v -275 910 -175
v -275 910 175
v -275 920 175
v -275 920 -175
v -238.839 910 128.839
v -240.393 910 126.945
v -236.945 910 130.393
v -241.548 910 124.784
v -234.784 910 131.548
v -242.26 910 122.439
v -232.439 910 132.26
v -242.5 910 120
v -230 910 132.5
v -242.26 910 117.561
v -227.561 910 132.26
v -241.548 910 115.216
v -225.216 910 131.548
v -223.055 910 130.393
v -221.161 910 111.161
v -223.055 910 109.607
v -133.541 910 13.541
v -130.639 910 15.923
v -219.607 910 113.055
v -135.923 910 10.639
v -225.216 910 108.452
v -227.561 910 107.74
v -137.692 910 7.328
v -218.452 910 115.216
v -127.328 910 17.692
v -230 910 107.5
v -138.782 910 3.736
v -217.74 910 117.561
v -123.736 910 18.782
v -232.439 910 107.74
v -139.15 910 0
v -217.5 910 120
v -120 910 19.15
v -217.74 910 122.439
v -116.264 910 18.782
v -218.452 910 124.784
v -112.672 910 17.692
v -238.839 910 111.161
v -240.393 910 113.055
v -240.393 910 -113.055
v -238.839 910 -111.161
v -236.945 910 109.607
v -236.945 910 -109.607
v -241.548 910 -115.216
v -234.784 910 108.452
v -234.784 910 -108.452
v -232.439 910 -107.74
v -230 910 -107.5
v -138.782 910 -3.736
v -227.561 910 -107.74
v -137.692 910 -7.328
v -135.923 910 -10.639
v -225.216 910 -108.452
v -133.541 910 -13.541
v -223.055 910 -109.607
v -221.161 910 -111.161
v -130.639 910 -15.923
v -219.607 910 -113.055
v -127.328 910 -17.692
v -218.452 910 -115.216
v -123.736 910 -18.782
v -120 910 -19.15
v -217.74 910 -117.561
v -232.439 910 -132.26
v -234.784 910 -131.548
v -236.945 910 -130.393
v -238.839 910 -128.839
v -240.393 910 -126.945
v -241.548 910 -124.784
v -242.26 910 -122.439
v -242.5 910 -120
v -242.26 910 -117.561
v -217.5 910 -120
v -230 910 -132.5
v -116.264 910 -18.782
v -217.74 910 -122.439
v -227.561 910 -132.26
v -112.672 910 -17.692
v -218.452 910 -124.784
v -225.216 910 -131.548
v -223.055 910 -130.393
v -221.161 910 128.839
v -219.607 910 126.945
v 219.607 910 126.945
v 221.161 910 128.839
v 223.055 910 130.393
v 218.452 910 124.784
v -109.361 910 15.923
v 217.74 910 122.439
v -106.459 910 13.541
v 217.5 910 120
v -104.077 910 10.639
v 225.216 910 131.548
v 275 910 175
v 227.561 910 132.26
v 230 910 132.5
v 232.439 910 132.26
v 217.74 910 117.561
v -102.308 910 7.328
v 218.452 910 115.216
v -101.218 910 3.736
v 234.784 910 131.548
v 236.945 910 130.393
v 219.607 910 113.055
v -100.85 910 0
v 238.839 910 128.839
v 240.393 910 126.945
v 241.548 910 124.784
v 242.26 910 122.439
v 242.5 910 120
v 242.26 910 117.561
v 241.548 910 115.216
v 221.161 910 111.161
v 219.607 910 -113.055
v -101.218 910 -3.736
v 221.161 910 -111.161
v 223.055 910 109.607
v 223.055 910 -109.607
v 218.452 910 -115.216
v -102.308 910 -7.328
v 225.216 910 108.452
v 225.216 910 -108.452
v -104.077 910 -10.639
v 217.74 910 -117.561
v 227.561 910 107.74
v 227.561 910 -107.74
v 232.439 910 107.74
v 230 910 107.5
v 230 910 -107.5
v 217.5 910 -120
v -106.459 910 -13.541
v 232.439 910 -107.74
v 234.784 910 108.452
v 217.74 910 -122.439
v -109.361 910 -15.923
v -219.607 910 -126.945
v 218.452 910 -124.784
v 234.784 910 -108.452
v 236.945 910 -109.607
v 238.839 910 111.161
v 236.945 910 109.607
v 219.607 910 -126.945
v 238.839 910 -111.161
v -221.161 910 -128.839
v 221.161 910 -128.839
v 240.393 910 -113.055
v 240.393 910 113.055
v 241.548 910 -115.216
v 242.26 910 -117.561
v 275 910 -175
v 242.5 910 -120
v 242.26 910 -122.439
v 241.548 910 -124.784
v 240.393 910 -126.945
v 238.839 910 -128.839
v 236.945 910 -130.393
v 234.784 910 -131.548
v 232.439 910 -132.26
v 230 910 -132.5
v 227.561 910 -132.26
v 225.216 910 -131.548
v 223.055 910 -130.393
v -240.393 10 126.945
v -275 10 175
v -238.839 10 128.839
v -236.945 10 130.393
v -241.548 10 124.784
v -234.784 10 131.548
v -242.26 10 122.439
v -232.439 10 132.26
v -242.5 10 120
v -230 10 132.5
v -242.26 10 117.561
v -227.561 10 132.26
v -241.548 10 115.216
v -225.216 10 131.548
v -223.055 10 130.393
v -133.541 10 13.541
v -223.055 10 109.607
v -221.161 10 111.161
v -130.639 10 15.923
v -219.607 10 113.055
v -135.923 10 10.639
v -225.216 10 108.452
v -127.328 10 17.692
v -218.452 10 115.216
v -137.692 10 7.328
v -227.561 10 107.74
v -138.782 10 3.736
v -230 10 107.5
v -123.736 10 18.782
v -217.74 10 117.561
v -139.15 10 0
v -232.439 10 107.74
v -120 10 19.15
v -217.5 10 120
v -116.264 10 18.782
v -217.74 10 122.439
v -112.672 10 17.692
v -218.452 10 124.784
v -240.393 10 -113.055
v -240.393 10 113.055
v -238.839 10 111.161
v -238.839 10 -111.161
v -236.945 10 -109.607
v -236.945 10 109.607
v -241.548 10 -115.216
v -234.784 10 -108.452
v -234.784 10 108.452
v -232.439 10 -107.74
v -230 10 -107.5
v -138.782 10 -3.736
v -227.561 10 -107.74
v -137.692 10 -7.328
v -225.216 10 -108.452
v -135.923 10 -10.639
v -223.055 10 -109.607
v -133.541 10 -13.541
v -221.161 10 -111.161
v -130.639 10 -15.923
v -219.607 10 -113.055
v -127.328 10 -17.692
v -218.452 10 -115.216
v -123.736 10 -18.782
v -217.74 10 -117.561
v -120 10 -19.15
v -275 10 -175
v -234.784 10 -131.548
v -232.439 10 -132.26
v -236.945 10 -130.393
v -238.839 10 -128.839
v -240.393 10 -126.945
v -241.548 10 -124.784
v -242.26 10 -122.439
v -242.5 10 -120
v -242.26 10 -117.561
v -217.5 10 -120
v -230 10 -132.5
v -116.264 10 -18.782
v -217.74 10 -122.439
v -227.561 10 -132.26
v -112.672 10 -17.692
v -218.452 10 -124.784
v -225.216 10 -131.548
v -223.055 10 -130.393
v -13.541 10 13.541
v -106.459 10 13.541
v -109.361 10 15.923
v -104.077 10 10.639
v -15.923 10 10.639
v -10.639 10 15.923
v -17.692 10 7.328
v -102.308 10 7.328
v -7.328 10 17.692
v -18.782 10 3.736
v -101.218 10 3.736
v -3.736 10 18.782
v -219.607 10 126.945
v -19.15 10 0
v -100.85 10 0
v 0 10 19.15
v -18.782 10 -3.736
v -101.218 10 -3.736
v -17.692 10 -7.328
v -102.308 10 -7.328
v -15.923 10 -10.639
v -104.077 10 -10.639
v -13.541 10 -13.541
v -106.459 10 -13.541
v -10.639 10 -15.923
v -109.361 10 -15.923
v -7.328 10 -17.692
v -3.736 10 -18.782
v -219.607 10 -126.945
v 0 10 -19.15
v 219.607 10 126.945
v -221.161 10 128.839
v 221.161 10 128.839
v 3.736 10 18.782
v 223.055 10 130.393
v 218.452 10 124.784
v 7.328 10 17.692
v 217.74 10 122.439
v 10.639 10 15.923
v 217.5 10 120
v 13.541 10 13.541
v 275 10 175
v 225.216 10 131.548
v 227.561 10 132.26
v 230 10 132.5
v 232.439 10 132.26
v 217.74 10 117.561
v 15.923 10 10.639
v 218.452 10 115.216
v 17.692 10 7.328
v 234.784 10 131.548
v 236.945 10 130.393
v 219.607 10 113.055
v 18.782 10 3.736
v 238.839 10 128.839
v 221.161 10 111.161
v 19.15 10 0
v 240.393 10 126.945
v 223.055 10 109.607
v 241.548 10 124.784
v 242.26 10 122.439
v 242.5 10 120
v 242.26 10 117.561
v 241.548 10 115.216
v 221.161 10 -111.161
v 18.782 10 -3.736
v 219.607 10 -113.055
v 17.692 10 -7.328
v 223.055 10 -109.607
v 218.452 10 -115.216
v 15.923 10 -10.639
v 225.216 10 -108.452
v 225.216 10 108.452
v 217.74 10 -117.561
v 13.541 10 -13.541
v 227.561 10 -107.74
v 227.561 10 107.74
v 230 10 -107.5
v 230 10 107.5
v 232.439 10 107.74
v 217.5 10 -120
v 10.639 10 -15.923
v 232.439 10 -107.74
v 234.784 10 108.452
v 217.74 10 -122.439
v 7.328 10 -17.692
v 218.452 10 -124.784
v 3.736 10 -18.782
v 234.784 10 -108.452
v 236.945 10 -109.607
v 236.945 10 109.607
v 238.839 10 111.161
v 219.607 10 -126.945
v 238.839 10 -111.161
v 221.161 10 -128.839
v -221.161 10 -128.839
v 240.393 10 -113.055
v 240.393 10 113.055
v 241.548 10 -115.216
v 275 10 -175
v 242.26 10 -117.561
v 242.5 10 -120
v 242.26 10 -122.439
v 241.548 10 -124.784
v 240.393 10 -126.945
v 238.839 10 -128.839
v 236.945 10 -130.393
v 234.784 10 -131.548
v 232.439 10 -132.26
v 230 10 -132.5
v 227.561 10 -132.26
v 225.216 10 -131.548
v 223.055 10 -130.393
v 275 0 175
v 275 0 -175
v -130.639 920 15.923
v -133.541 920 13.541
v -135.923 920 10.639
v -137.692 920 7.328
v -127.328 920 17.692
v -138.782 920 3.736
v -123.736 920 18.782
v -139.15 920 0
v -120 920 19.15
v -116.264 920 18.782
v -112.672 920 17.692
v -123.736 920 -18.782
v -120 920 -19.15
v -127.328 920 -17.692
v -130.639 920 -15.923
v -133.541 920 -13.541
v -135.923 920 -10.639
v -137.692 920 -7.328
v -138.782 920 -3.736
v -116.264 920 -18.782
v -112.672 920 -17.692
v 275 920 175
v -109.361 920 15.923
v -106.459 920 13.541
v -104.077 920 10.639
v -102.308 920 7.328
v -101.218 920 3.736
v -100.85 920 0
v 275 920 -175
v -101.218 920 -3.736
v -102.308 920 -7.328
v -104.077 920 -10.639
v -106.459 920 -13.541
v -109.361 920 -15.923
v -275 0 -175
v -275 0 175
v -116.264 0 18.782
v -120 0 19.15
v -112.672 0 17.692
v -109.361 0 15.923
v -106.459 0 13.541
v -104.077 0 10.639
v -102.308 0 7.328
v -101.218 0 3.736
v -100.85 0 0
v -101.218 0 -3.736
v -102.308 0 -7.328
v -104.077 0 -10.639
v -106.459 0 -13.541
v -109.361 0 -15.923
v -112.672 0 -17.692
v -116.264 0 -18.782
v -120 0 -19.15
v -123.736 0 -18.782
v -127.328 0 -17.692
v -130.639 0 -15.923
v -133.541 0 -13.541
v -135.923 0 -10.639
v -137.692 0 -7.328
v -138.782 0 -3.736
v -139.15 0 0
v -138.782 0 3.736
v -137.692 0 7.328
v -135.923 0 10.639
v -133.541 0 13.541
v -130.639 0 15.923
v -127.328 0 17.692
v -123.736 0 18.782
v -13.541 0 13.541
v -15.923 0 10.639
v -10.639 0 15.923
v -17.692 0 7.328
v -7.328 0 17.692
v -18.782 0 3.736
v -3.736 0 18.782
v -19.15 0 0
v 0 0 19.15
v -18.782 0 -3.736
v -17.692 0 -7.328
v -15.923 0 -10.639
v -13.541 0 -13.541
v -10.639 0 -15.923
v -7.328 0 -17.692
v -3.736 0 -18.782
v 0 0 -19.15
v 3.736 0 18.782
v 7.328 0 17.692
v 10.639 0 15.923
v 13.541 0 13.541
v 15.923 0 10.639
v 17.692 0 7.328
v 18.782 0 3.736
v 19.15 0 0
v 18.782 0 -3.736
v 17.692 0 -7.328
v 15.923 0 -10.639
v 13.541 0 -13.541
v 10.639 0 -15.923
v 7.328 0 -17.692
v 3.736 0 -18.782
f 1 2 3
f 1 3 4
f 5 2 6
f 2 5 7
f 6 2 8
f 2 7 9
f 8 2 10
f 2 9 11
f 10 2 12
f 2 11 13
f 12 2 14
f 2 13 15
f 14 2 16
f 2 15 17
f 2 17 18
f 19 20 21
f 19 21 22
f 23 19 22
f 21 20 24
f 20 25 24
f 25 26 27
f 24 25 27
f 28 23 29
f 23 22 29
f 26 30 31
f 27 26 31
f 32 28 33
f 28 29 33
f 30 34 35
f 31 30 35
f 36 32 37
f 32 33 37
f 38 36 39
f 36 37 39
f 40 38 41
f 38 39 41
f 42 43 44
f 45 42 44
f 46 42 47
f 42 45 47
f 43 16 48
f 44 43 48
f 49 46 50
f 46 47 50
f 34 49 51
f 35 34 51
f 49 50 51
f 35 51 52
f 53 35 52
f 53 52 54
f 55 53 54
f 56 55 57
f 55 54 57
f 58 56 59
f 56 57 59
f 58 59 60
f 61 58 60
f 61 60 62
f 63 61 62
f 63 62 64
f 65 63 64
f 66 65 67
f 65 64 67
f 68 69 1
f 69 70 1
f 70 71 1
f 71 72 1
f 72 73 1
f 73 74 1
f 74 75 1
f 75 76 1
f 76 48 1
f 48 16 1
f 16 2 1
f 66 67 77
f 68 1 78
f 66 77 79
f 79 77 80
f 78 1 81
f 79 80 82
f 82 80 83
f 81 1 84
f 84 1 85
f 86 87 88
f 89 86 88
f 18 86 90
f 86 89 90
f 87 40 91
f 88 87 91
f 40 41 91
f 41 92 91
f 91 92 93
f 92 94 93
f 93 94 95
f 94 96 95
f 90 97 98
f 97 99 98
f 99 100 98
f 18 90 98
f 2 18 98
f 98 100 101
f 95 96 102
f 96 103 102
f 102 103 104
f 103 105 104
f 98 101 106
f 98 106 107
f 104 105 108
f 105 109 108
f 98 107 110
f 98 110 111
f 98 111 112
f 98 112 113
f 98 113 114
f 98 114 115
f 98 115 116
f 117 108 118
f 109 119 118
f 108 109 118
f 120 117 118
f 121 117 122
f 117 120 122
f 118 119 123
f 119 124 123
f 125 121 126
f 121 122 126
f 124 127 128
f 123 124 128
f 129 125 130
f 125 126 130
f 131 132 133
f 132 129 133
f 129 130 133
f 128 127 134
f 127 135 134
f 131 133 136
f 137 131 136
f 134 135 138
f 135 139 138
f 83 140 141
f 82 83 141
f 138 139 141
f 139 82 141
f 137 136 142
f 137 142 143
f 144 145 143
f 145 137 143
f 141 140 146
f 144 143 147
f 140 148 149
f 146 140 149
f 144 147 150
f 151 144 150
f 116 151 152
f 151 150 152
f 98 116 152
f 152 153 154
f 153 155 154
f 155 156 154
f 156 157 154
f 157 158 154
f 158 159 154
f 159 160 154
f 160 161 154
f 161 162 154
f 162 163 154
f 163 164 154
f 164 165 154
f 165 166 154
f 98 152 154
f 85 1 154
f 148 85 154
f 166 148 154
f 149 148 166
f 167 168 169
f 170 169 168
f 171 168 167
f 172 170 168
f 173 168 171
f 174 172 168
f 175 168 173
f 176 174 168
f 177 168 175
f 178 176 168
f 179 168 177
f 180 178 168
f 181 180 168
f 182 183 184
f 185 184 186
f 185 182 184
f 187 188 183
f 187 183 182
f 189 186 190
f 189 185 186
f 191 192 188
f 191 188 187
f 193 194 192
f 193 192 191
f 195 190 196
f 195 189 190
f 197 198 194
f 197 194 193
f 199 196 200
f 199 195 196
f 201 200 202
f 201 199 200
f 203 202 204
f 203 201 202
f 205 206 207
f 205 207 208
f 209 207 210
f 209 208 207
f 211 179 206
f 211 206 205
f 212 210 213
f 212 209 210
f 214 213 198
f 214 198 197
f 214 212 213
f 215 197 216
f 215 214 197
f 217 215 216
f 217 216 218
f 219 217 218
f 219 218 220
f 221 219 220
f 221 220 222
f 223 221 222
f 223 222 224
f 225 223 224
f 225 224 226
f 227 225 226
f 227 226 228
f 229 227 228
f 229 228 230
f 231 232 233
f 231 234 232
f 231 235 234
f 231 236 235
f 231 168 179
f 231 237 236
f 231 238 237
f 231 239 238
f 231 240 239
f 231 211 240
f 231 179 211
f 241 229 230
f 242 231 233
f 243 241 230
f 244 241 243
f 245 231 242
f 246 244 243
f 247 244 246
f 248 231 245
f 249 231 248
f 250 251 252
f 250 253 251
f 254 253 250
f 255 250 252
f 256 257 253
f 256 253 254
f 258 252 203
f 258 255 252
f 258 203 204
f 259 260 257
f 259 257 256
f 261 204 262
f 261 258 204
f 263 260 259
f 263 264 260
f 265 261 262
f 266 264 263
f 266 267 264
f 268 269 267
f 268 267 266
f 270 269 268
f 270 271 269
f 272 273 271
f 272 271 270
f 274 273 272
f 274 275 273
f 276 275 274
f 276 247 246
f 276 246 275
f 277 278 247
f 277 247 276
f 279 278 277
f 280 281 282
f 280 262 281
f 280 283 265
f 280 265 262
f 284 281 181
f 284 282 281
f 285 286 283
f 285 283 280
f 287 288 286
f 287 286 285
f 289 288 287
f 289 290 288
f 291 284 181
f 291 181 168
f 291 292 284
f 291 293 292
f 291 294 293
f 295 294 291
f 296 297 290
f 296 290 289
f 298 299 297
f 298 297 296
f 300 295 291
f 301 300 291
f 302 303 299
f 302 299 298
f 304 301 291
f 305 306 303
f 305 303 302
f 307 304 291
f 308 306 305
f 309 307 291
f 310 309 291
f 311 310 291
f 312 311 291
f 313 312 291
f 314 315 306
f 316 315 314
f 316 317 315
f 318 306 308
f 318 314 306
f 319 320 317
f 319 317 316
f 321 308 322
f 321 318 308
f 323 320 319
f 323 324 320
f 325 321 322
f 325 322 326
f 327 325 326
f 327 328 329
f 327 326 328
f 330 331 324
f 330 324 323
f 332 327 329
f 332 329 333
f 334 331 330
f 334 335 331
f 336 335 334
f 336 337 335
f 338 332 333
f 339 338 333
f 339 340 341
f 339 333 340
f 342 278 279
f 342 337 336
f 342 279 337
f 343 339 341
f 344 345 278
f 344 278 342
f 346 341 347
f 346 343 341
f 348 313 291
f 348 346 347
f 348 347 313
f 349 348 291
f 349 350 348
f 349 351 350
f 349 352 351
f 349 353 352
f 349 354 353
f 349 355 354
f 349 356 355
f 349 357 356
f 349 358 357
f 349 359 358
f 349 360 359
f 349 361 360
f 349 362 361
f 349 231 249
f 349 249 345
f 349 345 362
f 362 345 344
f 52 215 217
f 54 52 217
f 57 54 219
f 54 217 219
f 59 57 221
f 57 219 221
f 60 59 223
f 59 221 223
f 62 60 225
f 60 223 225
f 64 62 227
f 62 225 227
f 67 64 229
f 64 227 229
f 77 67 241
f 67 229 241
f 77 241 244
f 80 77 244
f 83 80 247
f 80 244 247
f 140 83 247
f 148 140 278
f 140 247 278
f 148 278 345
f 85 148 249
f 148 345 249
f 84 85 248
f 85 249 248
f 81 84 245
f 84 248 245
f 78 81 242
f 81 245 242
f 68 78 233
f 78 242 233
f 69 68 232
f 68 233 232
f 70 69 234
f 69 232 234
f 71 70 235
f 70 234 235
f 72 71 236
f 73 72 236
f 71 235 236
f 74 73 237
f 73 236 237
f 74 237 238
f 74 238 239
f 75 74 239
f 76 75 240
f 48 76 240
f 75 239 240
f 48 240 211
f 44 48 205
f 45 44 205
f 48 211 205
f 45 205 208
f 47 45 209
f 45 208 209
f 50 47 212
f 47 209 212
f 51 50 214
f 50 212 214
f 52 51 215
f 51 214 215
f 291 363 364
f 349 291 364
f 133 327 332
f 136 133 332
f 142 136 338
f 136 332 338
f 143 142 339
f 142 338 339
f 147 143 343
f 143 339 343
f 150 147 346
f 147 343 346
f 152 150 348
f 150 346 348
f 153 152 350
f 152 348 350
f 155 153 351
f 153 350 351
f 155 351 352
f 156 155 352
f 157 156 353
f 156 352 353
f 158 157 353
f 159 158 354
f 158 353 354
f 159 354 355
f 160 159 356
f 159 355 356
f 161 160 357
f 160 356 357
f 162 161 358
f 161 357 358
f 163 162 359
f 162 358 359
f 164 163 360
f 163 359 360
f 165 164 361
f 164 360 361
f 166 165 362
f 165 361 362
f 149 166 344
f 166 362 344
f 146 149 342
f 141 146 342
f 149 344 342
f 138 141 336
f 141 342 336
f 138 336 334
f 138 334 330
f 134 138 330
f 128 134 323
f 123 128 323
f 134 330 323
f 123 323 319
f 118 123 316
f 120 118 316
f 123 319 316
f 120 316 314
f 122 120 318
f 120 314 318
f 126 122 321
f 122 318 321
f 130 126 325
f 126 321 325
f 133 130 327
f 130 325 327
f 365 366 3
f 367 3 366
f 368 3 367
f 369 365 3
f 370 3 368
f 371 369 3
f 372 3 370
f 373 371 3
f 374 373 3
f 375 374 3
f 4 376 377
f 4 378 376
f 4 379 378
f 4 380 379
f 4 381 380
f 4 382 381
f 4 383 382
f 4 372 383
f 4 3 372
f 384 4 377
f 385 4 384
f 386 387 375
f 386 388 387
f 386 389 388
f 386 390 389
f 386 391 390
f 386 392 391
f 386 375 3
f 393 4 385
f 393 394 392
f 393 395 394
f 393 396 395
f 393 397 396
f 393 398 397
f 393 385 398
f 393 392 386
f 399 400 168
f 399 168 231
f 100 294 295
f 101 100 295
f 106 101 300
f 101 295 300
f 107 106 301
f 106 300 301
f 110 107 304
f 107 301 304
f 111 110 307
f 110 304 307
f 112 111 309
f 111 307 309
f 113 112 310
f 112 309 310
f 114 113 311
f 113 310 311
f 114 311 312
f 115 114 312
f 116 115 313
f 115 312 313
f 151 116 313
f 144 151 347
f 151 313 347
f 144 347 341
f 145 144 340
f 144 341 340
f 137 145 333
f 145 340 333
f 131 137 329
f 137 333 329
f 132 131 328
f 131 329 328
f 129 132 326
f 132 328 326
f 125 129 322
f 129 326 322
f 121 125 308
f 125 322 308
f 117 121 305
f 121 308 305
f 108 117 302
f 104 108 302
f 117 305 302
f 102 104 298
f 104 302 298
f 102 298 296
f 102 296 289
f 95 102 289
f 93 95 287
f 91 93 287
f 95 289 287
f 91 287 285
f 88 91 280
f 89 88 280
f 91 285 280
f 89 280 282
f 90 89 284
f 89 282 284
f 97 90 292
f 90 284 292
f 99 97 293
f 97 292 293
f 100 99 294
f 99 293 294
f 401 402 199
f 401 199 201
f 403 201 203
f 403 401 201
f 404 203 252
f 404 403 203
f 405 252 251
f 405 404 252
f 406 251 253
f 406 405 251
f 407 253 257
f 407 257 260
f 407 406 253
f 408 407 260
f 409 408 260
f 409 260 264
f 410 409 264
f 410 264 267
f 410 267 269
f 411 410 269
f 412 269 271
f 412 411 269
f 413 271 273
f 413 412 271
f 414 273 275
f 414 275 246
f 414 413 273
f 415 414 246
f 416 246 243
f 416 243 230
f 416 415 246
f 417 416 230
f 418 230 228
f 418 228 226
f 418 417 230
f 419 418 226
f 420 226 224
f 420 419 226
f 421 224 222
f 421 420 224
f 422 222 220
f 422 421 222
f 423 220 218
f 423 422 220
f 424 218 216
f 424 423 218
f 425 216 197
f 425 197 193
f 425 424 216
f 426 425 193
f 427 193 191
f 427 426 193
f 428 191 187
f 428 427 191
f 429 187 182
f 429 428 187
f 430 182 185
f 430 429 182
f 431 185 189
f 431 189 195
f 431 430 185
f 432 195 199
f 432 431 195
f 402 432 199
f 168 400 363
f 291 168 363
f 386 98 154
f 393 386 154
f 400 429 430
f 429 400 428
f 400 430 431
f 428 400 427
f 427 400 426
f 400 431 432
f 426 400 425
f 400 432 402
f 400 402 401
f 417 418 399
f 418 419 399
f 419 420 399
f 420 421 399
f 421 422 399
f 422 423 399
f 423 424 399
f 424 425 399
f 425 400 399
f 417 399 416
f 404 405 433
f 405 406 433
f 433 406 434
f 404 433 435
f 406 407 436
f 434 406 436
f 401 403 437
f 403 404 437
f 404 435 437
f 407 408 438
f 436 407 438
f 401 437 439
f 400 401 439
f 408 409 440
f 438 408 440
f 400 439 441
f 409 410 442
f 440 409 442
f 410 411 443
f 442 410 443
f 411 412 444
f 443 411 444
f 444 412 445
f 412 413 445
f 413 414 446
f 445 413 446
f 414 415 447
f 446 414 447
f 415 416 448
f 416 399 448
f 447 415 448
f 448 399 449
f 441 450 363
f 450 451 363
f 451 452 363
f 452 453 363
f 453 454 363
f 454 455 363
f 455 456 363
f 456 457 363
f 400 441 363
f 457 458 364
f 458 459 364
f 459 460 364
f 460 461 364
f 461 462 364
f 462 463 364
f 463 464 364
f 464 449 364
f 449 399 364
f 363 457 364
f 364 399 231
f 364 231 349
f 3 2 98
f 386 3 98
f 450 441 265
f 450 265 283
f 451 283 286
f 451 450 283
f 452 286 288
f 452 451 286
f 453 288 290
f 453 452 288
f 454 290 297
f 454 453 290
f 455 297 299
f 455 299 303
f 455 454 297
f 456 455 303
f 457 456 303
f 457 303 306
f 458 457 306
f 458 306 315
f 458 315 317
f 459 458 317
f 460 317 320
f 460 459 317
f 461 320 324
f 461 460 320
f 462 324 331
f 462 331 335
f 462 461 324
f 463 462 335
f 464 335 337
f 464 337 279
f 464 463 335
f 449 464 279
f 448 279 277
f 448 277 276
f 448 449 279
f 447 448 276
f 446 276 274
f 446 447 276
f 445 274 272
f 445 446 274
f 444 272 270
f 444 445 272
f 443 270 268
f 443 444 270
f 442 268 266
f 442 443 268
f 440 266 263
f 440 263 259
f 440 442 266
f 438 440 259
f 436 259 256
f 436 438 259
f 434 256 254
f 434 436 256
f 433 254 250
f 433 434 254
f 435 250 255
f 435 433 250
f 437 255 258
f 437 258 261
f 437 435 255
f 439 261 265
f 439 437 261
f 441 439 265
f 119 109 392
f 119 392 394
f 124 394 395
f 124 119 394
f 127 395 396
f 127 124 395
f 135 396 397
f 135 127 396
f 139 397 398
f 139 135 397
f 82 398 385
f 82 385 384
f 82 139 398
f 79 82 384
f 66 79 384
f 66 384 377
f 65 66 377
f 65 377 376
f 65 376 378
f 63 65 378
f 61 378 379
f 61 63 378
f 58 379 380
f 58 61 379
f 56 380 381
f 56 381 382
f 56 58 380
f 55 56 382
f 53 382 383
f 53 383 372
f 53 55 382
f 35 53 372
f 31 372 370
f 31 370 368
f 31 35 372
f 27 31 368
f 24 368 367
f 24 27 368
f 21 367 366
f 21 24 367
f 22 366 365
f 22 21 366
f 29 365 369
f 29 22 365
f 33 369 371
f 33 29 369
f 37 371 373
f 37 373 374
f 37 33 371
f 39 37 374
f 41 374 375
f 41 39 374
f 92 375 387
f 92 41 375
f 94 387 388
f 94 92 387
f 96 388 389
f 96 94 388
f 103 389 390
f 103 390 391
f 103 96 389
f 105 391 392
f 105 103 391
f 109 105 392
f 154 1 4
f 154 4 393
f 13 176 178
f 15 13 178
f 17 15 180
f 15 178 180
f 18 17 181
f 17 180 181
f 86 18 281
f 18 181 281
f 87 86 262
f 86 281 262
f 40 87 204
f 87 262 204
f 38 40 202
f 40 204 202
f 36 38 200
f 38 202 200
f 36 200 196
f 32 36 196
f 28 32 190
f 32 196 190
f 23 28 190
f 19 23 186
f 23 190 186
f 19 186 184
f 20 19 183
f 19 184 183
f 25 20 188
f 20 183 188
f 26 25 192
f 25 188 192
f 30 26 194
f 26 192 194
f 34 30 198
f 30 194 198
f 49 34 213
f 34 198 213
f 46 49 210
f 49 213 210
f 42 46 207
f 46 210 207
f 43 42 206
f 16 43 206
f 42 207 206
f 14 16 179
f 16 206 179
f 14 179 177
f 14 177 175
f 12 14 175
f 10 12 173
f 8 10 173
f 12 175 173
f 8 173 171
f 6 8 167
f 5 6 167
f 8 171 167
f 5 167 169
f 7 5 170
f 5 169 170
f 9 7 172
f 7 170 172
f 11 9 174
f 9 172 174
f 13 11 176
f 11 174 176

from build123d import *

# Parameters (mm, degrees)
SKETCH1_W           = 550
SKETCH1_H           = 350
BOSS_EXTRUDE1_DEPTH = 10
SKETCH2_R           = 12.5
BOSS_EXTRUDE2_DEPTH = 900
BOSS_EXTRUDE3_START = 910
SKETCH1_2_W         = 550
SKETCH1_2_H         = 350
BOSS_EXTRUDE3_DEPTH = 10
CUT_EXTRUDE1_START  = -920
SKETCH3_R           = 19.15
CUT_EXTRUDE1_DEPTH  = 10
LPATTERN1_COUNT     = 2
LPATTERN1_PITCH     = 120
MIRROR1_START       = 910
MIRROR1_OUTLINE_R   = 19.15
MIRROR1_DEPTH       = 10


# Read off the part's stored shape, not the designer's step: Mirror1
with BuildPart() as part:
    # Sketch1 → Boss-Extrude1 (new body)
    with BuildSketch(Plane(origin=(0, 0, 0), x_dir=(1, 0, 0), z_dir=(0, 1, 0))):
        Rectangle(SKETCH1_W, SKETCH1_H)
    extrude(amount=BOSS_EXTRUDE1_DEPTH)

    # Sketch2 → Boss-Extrude2 (add)
    with BuildSketch(Plane(origin=(0, 10, 0), x_dir=(1, 0, 0), z_dir=(0, 1, 0))):
        with Locations(Location((-230, 120, 0), (0, 0, 270))):
            Circle(SKETCH2_R)
        with Locations(Location((-230, -120, 0), (0, 0, 270))):
            Circle(SKETCH2_R)
        with Locations(Location((230, -120, 0), (0, 0, 270))):
            Circle(SKETCH2_R)
        with Locations(Location((230, 120, 0), (0, 0, 270))):
            Circle(SKETCH2_R)
    extrude(amount=BOSS_EXTRUDE2_DEPTH)

    # Sketch1<2> → Boss-Extrude3 (add)
    with BuildSketch(Plane(origin=(0, 0, 0), x_dir=(1, 0, 0), z_dir=(0, 1, 0)).offset(BOSS_EXTRUDE3_START)):
        Rectangle(SKETCH1_2_W, SKETCH1_2_H)
    extrude(amount=BOSS_EXTRUDE3_DEPTH)

    # Sketch3 → Cut-Extrude1 (cut)
    with BuildSketch(Plane(origin=(0, 920, 0), x_dir=(1, 0, 0), z_dir=(0, 1, 0)).offset(CUT_EXTRUDE1_START)):
        with Locations(Location((-120, 0, 0), (0, 0, 270))):
            Circle(SKETCH3_R)
    cut_extrude1 = extrude(amount=CUT_EXTRUDE1_DEPTH, mode=Mode.SUBTRACT)

    # LPattern1: Cut-Extrude1 ×2
    with Locations(*[(i * LPATTERN1_PITCH, 0, 0) for i in range(1, LPATTERN1_COUNT)]):
        add(cut_extrude1, mode=Mode.SUBTRACT)

    # Mirror1 outline → Mirror1 (cut)
    with BuildSketch(Plane(origin=(0, 0, 0), x_dir=(1, 0, 0), z_dir=(0, 1, 0)).offset(MIRROR1_START)):
        with Locations((-120, 0)):
            Circle(MIRROR1_OUTLINE_R)
    extrude(amount=MIRROR1_DEPTH, mode=Mode.SUBTRACT)


solid = part.part
